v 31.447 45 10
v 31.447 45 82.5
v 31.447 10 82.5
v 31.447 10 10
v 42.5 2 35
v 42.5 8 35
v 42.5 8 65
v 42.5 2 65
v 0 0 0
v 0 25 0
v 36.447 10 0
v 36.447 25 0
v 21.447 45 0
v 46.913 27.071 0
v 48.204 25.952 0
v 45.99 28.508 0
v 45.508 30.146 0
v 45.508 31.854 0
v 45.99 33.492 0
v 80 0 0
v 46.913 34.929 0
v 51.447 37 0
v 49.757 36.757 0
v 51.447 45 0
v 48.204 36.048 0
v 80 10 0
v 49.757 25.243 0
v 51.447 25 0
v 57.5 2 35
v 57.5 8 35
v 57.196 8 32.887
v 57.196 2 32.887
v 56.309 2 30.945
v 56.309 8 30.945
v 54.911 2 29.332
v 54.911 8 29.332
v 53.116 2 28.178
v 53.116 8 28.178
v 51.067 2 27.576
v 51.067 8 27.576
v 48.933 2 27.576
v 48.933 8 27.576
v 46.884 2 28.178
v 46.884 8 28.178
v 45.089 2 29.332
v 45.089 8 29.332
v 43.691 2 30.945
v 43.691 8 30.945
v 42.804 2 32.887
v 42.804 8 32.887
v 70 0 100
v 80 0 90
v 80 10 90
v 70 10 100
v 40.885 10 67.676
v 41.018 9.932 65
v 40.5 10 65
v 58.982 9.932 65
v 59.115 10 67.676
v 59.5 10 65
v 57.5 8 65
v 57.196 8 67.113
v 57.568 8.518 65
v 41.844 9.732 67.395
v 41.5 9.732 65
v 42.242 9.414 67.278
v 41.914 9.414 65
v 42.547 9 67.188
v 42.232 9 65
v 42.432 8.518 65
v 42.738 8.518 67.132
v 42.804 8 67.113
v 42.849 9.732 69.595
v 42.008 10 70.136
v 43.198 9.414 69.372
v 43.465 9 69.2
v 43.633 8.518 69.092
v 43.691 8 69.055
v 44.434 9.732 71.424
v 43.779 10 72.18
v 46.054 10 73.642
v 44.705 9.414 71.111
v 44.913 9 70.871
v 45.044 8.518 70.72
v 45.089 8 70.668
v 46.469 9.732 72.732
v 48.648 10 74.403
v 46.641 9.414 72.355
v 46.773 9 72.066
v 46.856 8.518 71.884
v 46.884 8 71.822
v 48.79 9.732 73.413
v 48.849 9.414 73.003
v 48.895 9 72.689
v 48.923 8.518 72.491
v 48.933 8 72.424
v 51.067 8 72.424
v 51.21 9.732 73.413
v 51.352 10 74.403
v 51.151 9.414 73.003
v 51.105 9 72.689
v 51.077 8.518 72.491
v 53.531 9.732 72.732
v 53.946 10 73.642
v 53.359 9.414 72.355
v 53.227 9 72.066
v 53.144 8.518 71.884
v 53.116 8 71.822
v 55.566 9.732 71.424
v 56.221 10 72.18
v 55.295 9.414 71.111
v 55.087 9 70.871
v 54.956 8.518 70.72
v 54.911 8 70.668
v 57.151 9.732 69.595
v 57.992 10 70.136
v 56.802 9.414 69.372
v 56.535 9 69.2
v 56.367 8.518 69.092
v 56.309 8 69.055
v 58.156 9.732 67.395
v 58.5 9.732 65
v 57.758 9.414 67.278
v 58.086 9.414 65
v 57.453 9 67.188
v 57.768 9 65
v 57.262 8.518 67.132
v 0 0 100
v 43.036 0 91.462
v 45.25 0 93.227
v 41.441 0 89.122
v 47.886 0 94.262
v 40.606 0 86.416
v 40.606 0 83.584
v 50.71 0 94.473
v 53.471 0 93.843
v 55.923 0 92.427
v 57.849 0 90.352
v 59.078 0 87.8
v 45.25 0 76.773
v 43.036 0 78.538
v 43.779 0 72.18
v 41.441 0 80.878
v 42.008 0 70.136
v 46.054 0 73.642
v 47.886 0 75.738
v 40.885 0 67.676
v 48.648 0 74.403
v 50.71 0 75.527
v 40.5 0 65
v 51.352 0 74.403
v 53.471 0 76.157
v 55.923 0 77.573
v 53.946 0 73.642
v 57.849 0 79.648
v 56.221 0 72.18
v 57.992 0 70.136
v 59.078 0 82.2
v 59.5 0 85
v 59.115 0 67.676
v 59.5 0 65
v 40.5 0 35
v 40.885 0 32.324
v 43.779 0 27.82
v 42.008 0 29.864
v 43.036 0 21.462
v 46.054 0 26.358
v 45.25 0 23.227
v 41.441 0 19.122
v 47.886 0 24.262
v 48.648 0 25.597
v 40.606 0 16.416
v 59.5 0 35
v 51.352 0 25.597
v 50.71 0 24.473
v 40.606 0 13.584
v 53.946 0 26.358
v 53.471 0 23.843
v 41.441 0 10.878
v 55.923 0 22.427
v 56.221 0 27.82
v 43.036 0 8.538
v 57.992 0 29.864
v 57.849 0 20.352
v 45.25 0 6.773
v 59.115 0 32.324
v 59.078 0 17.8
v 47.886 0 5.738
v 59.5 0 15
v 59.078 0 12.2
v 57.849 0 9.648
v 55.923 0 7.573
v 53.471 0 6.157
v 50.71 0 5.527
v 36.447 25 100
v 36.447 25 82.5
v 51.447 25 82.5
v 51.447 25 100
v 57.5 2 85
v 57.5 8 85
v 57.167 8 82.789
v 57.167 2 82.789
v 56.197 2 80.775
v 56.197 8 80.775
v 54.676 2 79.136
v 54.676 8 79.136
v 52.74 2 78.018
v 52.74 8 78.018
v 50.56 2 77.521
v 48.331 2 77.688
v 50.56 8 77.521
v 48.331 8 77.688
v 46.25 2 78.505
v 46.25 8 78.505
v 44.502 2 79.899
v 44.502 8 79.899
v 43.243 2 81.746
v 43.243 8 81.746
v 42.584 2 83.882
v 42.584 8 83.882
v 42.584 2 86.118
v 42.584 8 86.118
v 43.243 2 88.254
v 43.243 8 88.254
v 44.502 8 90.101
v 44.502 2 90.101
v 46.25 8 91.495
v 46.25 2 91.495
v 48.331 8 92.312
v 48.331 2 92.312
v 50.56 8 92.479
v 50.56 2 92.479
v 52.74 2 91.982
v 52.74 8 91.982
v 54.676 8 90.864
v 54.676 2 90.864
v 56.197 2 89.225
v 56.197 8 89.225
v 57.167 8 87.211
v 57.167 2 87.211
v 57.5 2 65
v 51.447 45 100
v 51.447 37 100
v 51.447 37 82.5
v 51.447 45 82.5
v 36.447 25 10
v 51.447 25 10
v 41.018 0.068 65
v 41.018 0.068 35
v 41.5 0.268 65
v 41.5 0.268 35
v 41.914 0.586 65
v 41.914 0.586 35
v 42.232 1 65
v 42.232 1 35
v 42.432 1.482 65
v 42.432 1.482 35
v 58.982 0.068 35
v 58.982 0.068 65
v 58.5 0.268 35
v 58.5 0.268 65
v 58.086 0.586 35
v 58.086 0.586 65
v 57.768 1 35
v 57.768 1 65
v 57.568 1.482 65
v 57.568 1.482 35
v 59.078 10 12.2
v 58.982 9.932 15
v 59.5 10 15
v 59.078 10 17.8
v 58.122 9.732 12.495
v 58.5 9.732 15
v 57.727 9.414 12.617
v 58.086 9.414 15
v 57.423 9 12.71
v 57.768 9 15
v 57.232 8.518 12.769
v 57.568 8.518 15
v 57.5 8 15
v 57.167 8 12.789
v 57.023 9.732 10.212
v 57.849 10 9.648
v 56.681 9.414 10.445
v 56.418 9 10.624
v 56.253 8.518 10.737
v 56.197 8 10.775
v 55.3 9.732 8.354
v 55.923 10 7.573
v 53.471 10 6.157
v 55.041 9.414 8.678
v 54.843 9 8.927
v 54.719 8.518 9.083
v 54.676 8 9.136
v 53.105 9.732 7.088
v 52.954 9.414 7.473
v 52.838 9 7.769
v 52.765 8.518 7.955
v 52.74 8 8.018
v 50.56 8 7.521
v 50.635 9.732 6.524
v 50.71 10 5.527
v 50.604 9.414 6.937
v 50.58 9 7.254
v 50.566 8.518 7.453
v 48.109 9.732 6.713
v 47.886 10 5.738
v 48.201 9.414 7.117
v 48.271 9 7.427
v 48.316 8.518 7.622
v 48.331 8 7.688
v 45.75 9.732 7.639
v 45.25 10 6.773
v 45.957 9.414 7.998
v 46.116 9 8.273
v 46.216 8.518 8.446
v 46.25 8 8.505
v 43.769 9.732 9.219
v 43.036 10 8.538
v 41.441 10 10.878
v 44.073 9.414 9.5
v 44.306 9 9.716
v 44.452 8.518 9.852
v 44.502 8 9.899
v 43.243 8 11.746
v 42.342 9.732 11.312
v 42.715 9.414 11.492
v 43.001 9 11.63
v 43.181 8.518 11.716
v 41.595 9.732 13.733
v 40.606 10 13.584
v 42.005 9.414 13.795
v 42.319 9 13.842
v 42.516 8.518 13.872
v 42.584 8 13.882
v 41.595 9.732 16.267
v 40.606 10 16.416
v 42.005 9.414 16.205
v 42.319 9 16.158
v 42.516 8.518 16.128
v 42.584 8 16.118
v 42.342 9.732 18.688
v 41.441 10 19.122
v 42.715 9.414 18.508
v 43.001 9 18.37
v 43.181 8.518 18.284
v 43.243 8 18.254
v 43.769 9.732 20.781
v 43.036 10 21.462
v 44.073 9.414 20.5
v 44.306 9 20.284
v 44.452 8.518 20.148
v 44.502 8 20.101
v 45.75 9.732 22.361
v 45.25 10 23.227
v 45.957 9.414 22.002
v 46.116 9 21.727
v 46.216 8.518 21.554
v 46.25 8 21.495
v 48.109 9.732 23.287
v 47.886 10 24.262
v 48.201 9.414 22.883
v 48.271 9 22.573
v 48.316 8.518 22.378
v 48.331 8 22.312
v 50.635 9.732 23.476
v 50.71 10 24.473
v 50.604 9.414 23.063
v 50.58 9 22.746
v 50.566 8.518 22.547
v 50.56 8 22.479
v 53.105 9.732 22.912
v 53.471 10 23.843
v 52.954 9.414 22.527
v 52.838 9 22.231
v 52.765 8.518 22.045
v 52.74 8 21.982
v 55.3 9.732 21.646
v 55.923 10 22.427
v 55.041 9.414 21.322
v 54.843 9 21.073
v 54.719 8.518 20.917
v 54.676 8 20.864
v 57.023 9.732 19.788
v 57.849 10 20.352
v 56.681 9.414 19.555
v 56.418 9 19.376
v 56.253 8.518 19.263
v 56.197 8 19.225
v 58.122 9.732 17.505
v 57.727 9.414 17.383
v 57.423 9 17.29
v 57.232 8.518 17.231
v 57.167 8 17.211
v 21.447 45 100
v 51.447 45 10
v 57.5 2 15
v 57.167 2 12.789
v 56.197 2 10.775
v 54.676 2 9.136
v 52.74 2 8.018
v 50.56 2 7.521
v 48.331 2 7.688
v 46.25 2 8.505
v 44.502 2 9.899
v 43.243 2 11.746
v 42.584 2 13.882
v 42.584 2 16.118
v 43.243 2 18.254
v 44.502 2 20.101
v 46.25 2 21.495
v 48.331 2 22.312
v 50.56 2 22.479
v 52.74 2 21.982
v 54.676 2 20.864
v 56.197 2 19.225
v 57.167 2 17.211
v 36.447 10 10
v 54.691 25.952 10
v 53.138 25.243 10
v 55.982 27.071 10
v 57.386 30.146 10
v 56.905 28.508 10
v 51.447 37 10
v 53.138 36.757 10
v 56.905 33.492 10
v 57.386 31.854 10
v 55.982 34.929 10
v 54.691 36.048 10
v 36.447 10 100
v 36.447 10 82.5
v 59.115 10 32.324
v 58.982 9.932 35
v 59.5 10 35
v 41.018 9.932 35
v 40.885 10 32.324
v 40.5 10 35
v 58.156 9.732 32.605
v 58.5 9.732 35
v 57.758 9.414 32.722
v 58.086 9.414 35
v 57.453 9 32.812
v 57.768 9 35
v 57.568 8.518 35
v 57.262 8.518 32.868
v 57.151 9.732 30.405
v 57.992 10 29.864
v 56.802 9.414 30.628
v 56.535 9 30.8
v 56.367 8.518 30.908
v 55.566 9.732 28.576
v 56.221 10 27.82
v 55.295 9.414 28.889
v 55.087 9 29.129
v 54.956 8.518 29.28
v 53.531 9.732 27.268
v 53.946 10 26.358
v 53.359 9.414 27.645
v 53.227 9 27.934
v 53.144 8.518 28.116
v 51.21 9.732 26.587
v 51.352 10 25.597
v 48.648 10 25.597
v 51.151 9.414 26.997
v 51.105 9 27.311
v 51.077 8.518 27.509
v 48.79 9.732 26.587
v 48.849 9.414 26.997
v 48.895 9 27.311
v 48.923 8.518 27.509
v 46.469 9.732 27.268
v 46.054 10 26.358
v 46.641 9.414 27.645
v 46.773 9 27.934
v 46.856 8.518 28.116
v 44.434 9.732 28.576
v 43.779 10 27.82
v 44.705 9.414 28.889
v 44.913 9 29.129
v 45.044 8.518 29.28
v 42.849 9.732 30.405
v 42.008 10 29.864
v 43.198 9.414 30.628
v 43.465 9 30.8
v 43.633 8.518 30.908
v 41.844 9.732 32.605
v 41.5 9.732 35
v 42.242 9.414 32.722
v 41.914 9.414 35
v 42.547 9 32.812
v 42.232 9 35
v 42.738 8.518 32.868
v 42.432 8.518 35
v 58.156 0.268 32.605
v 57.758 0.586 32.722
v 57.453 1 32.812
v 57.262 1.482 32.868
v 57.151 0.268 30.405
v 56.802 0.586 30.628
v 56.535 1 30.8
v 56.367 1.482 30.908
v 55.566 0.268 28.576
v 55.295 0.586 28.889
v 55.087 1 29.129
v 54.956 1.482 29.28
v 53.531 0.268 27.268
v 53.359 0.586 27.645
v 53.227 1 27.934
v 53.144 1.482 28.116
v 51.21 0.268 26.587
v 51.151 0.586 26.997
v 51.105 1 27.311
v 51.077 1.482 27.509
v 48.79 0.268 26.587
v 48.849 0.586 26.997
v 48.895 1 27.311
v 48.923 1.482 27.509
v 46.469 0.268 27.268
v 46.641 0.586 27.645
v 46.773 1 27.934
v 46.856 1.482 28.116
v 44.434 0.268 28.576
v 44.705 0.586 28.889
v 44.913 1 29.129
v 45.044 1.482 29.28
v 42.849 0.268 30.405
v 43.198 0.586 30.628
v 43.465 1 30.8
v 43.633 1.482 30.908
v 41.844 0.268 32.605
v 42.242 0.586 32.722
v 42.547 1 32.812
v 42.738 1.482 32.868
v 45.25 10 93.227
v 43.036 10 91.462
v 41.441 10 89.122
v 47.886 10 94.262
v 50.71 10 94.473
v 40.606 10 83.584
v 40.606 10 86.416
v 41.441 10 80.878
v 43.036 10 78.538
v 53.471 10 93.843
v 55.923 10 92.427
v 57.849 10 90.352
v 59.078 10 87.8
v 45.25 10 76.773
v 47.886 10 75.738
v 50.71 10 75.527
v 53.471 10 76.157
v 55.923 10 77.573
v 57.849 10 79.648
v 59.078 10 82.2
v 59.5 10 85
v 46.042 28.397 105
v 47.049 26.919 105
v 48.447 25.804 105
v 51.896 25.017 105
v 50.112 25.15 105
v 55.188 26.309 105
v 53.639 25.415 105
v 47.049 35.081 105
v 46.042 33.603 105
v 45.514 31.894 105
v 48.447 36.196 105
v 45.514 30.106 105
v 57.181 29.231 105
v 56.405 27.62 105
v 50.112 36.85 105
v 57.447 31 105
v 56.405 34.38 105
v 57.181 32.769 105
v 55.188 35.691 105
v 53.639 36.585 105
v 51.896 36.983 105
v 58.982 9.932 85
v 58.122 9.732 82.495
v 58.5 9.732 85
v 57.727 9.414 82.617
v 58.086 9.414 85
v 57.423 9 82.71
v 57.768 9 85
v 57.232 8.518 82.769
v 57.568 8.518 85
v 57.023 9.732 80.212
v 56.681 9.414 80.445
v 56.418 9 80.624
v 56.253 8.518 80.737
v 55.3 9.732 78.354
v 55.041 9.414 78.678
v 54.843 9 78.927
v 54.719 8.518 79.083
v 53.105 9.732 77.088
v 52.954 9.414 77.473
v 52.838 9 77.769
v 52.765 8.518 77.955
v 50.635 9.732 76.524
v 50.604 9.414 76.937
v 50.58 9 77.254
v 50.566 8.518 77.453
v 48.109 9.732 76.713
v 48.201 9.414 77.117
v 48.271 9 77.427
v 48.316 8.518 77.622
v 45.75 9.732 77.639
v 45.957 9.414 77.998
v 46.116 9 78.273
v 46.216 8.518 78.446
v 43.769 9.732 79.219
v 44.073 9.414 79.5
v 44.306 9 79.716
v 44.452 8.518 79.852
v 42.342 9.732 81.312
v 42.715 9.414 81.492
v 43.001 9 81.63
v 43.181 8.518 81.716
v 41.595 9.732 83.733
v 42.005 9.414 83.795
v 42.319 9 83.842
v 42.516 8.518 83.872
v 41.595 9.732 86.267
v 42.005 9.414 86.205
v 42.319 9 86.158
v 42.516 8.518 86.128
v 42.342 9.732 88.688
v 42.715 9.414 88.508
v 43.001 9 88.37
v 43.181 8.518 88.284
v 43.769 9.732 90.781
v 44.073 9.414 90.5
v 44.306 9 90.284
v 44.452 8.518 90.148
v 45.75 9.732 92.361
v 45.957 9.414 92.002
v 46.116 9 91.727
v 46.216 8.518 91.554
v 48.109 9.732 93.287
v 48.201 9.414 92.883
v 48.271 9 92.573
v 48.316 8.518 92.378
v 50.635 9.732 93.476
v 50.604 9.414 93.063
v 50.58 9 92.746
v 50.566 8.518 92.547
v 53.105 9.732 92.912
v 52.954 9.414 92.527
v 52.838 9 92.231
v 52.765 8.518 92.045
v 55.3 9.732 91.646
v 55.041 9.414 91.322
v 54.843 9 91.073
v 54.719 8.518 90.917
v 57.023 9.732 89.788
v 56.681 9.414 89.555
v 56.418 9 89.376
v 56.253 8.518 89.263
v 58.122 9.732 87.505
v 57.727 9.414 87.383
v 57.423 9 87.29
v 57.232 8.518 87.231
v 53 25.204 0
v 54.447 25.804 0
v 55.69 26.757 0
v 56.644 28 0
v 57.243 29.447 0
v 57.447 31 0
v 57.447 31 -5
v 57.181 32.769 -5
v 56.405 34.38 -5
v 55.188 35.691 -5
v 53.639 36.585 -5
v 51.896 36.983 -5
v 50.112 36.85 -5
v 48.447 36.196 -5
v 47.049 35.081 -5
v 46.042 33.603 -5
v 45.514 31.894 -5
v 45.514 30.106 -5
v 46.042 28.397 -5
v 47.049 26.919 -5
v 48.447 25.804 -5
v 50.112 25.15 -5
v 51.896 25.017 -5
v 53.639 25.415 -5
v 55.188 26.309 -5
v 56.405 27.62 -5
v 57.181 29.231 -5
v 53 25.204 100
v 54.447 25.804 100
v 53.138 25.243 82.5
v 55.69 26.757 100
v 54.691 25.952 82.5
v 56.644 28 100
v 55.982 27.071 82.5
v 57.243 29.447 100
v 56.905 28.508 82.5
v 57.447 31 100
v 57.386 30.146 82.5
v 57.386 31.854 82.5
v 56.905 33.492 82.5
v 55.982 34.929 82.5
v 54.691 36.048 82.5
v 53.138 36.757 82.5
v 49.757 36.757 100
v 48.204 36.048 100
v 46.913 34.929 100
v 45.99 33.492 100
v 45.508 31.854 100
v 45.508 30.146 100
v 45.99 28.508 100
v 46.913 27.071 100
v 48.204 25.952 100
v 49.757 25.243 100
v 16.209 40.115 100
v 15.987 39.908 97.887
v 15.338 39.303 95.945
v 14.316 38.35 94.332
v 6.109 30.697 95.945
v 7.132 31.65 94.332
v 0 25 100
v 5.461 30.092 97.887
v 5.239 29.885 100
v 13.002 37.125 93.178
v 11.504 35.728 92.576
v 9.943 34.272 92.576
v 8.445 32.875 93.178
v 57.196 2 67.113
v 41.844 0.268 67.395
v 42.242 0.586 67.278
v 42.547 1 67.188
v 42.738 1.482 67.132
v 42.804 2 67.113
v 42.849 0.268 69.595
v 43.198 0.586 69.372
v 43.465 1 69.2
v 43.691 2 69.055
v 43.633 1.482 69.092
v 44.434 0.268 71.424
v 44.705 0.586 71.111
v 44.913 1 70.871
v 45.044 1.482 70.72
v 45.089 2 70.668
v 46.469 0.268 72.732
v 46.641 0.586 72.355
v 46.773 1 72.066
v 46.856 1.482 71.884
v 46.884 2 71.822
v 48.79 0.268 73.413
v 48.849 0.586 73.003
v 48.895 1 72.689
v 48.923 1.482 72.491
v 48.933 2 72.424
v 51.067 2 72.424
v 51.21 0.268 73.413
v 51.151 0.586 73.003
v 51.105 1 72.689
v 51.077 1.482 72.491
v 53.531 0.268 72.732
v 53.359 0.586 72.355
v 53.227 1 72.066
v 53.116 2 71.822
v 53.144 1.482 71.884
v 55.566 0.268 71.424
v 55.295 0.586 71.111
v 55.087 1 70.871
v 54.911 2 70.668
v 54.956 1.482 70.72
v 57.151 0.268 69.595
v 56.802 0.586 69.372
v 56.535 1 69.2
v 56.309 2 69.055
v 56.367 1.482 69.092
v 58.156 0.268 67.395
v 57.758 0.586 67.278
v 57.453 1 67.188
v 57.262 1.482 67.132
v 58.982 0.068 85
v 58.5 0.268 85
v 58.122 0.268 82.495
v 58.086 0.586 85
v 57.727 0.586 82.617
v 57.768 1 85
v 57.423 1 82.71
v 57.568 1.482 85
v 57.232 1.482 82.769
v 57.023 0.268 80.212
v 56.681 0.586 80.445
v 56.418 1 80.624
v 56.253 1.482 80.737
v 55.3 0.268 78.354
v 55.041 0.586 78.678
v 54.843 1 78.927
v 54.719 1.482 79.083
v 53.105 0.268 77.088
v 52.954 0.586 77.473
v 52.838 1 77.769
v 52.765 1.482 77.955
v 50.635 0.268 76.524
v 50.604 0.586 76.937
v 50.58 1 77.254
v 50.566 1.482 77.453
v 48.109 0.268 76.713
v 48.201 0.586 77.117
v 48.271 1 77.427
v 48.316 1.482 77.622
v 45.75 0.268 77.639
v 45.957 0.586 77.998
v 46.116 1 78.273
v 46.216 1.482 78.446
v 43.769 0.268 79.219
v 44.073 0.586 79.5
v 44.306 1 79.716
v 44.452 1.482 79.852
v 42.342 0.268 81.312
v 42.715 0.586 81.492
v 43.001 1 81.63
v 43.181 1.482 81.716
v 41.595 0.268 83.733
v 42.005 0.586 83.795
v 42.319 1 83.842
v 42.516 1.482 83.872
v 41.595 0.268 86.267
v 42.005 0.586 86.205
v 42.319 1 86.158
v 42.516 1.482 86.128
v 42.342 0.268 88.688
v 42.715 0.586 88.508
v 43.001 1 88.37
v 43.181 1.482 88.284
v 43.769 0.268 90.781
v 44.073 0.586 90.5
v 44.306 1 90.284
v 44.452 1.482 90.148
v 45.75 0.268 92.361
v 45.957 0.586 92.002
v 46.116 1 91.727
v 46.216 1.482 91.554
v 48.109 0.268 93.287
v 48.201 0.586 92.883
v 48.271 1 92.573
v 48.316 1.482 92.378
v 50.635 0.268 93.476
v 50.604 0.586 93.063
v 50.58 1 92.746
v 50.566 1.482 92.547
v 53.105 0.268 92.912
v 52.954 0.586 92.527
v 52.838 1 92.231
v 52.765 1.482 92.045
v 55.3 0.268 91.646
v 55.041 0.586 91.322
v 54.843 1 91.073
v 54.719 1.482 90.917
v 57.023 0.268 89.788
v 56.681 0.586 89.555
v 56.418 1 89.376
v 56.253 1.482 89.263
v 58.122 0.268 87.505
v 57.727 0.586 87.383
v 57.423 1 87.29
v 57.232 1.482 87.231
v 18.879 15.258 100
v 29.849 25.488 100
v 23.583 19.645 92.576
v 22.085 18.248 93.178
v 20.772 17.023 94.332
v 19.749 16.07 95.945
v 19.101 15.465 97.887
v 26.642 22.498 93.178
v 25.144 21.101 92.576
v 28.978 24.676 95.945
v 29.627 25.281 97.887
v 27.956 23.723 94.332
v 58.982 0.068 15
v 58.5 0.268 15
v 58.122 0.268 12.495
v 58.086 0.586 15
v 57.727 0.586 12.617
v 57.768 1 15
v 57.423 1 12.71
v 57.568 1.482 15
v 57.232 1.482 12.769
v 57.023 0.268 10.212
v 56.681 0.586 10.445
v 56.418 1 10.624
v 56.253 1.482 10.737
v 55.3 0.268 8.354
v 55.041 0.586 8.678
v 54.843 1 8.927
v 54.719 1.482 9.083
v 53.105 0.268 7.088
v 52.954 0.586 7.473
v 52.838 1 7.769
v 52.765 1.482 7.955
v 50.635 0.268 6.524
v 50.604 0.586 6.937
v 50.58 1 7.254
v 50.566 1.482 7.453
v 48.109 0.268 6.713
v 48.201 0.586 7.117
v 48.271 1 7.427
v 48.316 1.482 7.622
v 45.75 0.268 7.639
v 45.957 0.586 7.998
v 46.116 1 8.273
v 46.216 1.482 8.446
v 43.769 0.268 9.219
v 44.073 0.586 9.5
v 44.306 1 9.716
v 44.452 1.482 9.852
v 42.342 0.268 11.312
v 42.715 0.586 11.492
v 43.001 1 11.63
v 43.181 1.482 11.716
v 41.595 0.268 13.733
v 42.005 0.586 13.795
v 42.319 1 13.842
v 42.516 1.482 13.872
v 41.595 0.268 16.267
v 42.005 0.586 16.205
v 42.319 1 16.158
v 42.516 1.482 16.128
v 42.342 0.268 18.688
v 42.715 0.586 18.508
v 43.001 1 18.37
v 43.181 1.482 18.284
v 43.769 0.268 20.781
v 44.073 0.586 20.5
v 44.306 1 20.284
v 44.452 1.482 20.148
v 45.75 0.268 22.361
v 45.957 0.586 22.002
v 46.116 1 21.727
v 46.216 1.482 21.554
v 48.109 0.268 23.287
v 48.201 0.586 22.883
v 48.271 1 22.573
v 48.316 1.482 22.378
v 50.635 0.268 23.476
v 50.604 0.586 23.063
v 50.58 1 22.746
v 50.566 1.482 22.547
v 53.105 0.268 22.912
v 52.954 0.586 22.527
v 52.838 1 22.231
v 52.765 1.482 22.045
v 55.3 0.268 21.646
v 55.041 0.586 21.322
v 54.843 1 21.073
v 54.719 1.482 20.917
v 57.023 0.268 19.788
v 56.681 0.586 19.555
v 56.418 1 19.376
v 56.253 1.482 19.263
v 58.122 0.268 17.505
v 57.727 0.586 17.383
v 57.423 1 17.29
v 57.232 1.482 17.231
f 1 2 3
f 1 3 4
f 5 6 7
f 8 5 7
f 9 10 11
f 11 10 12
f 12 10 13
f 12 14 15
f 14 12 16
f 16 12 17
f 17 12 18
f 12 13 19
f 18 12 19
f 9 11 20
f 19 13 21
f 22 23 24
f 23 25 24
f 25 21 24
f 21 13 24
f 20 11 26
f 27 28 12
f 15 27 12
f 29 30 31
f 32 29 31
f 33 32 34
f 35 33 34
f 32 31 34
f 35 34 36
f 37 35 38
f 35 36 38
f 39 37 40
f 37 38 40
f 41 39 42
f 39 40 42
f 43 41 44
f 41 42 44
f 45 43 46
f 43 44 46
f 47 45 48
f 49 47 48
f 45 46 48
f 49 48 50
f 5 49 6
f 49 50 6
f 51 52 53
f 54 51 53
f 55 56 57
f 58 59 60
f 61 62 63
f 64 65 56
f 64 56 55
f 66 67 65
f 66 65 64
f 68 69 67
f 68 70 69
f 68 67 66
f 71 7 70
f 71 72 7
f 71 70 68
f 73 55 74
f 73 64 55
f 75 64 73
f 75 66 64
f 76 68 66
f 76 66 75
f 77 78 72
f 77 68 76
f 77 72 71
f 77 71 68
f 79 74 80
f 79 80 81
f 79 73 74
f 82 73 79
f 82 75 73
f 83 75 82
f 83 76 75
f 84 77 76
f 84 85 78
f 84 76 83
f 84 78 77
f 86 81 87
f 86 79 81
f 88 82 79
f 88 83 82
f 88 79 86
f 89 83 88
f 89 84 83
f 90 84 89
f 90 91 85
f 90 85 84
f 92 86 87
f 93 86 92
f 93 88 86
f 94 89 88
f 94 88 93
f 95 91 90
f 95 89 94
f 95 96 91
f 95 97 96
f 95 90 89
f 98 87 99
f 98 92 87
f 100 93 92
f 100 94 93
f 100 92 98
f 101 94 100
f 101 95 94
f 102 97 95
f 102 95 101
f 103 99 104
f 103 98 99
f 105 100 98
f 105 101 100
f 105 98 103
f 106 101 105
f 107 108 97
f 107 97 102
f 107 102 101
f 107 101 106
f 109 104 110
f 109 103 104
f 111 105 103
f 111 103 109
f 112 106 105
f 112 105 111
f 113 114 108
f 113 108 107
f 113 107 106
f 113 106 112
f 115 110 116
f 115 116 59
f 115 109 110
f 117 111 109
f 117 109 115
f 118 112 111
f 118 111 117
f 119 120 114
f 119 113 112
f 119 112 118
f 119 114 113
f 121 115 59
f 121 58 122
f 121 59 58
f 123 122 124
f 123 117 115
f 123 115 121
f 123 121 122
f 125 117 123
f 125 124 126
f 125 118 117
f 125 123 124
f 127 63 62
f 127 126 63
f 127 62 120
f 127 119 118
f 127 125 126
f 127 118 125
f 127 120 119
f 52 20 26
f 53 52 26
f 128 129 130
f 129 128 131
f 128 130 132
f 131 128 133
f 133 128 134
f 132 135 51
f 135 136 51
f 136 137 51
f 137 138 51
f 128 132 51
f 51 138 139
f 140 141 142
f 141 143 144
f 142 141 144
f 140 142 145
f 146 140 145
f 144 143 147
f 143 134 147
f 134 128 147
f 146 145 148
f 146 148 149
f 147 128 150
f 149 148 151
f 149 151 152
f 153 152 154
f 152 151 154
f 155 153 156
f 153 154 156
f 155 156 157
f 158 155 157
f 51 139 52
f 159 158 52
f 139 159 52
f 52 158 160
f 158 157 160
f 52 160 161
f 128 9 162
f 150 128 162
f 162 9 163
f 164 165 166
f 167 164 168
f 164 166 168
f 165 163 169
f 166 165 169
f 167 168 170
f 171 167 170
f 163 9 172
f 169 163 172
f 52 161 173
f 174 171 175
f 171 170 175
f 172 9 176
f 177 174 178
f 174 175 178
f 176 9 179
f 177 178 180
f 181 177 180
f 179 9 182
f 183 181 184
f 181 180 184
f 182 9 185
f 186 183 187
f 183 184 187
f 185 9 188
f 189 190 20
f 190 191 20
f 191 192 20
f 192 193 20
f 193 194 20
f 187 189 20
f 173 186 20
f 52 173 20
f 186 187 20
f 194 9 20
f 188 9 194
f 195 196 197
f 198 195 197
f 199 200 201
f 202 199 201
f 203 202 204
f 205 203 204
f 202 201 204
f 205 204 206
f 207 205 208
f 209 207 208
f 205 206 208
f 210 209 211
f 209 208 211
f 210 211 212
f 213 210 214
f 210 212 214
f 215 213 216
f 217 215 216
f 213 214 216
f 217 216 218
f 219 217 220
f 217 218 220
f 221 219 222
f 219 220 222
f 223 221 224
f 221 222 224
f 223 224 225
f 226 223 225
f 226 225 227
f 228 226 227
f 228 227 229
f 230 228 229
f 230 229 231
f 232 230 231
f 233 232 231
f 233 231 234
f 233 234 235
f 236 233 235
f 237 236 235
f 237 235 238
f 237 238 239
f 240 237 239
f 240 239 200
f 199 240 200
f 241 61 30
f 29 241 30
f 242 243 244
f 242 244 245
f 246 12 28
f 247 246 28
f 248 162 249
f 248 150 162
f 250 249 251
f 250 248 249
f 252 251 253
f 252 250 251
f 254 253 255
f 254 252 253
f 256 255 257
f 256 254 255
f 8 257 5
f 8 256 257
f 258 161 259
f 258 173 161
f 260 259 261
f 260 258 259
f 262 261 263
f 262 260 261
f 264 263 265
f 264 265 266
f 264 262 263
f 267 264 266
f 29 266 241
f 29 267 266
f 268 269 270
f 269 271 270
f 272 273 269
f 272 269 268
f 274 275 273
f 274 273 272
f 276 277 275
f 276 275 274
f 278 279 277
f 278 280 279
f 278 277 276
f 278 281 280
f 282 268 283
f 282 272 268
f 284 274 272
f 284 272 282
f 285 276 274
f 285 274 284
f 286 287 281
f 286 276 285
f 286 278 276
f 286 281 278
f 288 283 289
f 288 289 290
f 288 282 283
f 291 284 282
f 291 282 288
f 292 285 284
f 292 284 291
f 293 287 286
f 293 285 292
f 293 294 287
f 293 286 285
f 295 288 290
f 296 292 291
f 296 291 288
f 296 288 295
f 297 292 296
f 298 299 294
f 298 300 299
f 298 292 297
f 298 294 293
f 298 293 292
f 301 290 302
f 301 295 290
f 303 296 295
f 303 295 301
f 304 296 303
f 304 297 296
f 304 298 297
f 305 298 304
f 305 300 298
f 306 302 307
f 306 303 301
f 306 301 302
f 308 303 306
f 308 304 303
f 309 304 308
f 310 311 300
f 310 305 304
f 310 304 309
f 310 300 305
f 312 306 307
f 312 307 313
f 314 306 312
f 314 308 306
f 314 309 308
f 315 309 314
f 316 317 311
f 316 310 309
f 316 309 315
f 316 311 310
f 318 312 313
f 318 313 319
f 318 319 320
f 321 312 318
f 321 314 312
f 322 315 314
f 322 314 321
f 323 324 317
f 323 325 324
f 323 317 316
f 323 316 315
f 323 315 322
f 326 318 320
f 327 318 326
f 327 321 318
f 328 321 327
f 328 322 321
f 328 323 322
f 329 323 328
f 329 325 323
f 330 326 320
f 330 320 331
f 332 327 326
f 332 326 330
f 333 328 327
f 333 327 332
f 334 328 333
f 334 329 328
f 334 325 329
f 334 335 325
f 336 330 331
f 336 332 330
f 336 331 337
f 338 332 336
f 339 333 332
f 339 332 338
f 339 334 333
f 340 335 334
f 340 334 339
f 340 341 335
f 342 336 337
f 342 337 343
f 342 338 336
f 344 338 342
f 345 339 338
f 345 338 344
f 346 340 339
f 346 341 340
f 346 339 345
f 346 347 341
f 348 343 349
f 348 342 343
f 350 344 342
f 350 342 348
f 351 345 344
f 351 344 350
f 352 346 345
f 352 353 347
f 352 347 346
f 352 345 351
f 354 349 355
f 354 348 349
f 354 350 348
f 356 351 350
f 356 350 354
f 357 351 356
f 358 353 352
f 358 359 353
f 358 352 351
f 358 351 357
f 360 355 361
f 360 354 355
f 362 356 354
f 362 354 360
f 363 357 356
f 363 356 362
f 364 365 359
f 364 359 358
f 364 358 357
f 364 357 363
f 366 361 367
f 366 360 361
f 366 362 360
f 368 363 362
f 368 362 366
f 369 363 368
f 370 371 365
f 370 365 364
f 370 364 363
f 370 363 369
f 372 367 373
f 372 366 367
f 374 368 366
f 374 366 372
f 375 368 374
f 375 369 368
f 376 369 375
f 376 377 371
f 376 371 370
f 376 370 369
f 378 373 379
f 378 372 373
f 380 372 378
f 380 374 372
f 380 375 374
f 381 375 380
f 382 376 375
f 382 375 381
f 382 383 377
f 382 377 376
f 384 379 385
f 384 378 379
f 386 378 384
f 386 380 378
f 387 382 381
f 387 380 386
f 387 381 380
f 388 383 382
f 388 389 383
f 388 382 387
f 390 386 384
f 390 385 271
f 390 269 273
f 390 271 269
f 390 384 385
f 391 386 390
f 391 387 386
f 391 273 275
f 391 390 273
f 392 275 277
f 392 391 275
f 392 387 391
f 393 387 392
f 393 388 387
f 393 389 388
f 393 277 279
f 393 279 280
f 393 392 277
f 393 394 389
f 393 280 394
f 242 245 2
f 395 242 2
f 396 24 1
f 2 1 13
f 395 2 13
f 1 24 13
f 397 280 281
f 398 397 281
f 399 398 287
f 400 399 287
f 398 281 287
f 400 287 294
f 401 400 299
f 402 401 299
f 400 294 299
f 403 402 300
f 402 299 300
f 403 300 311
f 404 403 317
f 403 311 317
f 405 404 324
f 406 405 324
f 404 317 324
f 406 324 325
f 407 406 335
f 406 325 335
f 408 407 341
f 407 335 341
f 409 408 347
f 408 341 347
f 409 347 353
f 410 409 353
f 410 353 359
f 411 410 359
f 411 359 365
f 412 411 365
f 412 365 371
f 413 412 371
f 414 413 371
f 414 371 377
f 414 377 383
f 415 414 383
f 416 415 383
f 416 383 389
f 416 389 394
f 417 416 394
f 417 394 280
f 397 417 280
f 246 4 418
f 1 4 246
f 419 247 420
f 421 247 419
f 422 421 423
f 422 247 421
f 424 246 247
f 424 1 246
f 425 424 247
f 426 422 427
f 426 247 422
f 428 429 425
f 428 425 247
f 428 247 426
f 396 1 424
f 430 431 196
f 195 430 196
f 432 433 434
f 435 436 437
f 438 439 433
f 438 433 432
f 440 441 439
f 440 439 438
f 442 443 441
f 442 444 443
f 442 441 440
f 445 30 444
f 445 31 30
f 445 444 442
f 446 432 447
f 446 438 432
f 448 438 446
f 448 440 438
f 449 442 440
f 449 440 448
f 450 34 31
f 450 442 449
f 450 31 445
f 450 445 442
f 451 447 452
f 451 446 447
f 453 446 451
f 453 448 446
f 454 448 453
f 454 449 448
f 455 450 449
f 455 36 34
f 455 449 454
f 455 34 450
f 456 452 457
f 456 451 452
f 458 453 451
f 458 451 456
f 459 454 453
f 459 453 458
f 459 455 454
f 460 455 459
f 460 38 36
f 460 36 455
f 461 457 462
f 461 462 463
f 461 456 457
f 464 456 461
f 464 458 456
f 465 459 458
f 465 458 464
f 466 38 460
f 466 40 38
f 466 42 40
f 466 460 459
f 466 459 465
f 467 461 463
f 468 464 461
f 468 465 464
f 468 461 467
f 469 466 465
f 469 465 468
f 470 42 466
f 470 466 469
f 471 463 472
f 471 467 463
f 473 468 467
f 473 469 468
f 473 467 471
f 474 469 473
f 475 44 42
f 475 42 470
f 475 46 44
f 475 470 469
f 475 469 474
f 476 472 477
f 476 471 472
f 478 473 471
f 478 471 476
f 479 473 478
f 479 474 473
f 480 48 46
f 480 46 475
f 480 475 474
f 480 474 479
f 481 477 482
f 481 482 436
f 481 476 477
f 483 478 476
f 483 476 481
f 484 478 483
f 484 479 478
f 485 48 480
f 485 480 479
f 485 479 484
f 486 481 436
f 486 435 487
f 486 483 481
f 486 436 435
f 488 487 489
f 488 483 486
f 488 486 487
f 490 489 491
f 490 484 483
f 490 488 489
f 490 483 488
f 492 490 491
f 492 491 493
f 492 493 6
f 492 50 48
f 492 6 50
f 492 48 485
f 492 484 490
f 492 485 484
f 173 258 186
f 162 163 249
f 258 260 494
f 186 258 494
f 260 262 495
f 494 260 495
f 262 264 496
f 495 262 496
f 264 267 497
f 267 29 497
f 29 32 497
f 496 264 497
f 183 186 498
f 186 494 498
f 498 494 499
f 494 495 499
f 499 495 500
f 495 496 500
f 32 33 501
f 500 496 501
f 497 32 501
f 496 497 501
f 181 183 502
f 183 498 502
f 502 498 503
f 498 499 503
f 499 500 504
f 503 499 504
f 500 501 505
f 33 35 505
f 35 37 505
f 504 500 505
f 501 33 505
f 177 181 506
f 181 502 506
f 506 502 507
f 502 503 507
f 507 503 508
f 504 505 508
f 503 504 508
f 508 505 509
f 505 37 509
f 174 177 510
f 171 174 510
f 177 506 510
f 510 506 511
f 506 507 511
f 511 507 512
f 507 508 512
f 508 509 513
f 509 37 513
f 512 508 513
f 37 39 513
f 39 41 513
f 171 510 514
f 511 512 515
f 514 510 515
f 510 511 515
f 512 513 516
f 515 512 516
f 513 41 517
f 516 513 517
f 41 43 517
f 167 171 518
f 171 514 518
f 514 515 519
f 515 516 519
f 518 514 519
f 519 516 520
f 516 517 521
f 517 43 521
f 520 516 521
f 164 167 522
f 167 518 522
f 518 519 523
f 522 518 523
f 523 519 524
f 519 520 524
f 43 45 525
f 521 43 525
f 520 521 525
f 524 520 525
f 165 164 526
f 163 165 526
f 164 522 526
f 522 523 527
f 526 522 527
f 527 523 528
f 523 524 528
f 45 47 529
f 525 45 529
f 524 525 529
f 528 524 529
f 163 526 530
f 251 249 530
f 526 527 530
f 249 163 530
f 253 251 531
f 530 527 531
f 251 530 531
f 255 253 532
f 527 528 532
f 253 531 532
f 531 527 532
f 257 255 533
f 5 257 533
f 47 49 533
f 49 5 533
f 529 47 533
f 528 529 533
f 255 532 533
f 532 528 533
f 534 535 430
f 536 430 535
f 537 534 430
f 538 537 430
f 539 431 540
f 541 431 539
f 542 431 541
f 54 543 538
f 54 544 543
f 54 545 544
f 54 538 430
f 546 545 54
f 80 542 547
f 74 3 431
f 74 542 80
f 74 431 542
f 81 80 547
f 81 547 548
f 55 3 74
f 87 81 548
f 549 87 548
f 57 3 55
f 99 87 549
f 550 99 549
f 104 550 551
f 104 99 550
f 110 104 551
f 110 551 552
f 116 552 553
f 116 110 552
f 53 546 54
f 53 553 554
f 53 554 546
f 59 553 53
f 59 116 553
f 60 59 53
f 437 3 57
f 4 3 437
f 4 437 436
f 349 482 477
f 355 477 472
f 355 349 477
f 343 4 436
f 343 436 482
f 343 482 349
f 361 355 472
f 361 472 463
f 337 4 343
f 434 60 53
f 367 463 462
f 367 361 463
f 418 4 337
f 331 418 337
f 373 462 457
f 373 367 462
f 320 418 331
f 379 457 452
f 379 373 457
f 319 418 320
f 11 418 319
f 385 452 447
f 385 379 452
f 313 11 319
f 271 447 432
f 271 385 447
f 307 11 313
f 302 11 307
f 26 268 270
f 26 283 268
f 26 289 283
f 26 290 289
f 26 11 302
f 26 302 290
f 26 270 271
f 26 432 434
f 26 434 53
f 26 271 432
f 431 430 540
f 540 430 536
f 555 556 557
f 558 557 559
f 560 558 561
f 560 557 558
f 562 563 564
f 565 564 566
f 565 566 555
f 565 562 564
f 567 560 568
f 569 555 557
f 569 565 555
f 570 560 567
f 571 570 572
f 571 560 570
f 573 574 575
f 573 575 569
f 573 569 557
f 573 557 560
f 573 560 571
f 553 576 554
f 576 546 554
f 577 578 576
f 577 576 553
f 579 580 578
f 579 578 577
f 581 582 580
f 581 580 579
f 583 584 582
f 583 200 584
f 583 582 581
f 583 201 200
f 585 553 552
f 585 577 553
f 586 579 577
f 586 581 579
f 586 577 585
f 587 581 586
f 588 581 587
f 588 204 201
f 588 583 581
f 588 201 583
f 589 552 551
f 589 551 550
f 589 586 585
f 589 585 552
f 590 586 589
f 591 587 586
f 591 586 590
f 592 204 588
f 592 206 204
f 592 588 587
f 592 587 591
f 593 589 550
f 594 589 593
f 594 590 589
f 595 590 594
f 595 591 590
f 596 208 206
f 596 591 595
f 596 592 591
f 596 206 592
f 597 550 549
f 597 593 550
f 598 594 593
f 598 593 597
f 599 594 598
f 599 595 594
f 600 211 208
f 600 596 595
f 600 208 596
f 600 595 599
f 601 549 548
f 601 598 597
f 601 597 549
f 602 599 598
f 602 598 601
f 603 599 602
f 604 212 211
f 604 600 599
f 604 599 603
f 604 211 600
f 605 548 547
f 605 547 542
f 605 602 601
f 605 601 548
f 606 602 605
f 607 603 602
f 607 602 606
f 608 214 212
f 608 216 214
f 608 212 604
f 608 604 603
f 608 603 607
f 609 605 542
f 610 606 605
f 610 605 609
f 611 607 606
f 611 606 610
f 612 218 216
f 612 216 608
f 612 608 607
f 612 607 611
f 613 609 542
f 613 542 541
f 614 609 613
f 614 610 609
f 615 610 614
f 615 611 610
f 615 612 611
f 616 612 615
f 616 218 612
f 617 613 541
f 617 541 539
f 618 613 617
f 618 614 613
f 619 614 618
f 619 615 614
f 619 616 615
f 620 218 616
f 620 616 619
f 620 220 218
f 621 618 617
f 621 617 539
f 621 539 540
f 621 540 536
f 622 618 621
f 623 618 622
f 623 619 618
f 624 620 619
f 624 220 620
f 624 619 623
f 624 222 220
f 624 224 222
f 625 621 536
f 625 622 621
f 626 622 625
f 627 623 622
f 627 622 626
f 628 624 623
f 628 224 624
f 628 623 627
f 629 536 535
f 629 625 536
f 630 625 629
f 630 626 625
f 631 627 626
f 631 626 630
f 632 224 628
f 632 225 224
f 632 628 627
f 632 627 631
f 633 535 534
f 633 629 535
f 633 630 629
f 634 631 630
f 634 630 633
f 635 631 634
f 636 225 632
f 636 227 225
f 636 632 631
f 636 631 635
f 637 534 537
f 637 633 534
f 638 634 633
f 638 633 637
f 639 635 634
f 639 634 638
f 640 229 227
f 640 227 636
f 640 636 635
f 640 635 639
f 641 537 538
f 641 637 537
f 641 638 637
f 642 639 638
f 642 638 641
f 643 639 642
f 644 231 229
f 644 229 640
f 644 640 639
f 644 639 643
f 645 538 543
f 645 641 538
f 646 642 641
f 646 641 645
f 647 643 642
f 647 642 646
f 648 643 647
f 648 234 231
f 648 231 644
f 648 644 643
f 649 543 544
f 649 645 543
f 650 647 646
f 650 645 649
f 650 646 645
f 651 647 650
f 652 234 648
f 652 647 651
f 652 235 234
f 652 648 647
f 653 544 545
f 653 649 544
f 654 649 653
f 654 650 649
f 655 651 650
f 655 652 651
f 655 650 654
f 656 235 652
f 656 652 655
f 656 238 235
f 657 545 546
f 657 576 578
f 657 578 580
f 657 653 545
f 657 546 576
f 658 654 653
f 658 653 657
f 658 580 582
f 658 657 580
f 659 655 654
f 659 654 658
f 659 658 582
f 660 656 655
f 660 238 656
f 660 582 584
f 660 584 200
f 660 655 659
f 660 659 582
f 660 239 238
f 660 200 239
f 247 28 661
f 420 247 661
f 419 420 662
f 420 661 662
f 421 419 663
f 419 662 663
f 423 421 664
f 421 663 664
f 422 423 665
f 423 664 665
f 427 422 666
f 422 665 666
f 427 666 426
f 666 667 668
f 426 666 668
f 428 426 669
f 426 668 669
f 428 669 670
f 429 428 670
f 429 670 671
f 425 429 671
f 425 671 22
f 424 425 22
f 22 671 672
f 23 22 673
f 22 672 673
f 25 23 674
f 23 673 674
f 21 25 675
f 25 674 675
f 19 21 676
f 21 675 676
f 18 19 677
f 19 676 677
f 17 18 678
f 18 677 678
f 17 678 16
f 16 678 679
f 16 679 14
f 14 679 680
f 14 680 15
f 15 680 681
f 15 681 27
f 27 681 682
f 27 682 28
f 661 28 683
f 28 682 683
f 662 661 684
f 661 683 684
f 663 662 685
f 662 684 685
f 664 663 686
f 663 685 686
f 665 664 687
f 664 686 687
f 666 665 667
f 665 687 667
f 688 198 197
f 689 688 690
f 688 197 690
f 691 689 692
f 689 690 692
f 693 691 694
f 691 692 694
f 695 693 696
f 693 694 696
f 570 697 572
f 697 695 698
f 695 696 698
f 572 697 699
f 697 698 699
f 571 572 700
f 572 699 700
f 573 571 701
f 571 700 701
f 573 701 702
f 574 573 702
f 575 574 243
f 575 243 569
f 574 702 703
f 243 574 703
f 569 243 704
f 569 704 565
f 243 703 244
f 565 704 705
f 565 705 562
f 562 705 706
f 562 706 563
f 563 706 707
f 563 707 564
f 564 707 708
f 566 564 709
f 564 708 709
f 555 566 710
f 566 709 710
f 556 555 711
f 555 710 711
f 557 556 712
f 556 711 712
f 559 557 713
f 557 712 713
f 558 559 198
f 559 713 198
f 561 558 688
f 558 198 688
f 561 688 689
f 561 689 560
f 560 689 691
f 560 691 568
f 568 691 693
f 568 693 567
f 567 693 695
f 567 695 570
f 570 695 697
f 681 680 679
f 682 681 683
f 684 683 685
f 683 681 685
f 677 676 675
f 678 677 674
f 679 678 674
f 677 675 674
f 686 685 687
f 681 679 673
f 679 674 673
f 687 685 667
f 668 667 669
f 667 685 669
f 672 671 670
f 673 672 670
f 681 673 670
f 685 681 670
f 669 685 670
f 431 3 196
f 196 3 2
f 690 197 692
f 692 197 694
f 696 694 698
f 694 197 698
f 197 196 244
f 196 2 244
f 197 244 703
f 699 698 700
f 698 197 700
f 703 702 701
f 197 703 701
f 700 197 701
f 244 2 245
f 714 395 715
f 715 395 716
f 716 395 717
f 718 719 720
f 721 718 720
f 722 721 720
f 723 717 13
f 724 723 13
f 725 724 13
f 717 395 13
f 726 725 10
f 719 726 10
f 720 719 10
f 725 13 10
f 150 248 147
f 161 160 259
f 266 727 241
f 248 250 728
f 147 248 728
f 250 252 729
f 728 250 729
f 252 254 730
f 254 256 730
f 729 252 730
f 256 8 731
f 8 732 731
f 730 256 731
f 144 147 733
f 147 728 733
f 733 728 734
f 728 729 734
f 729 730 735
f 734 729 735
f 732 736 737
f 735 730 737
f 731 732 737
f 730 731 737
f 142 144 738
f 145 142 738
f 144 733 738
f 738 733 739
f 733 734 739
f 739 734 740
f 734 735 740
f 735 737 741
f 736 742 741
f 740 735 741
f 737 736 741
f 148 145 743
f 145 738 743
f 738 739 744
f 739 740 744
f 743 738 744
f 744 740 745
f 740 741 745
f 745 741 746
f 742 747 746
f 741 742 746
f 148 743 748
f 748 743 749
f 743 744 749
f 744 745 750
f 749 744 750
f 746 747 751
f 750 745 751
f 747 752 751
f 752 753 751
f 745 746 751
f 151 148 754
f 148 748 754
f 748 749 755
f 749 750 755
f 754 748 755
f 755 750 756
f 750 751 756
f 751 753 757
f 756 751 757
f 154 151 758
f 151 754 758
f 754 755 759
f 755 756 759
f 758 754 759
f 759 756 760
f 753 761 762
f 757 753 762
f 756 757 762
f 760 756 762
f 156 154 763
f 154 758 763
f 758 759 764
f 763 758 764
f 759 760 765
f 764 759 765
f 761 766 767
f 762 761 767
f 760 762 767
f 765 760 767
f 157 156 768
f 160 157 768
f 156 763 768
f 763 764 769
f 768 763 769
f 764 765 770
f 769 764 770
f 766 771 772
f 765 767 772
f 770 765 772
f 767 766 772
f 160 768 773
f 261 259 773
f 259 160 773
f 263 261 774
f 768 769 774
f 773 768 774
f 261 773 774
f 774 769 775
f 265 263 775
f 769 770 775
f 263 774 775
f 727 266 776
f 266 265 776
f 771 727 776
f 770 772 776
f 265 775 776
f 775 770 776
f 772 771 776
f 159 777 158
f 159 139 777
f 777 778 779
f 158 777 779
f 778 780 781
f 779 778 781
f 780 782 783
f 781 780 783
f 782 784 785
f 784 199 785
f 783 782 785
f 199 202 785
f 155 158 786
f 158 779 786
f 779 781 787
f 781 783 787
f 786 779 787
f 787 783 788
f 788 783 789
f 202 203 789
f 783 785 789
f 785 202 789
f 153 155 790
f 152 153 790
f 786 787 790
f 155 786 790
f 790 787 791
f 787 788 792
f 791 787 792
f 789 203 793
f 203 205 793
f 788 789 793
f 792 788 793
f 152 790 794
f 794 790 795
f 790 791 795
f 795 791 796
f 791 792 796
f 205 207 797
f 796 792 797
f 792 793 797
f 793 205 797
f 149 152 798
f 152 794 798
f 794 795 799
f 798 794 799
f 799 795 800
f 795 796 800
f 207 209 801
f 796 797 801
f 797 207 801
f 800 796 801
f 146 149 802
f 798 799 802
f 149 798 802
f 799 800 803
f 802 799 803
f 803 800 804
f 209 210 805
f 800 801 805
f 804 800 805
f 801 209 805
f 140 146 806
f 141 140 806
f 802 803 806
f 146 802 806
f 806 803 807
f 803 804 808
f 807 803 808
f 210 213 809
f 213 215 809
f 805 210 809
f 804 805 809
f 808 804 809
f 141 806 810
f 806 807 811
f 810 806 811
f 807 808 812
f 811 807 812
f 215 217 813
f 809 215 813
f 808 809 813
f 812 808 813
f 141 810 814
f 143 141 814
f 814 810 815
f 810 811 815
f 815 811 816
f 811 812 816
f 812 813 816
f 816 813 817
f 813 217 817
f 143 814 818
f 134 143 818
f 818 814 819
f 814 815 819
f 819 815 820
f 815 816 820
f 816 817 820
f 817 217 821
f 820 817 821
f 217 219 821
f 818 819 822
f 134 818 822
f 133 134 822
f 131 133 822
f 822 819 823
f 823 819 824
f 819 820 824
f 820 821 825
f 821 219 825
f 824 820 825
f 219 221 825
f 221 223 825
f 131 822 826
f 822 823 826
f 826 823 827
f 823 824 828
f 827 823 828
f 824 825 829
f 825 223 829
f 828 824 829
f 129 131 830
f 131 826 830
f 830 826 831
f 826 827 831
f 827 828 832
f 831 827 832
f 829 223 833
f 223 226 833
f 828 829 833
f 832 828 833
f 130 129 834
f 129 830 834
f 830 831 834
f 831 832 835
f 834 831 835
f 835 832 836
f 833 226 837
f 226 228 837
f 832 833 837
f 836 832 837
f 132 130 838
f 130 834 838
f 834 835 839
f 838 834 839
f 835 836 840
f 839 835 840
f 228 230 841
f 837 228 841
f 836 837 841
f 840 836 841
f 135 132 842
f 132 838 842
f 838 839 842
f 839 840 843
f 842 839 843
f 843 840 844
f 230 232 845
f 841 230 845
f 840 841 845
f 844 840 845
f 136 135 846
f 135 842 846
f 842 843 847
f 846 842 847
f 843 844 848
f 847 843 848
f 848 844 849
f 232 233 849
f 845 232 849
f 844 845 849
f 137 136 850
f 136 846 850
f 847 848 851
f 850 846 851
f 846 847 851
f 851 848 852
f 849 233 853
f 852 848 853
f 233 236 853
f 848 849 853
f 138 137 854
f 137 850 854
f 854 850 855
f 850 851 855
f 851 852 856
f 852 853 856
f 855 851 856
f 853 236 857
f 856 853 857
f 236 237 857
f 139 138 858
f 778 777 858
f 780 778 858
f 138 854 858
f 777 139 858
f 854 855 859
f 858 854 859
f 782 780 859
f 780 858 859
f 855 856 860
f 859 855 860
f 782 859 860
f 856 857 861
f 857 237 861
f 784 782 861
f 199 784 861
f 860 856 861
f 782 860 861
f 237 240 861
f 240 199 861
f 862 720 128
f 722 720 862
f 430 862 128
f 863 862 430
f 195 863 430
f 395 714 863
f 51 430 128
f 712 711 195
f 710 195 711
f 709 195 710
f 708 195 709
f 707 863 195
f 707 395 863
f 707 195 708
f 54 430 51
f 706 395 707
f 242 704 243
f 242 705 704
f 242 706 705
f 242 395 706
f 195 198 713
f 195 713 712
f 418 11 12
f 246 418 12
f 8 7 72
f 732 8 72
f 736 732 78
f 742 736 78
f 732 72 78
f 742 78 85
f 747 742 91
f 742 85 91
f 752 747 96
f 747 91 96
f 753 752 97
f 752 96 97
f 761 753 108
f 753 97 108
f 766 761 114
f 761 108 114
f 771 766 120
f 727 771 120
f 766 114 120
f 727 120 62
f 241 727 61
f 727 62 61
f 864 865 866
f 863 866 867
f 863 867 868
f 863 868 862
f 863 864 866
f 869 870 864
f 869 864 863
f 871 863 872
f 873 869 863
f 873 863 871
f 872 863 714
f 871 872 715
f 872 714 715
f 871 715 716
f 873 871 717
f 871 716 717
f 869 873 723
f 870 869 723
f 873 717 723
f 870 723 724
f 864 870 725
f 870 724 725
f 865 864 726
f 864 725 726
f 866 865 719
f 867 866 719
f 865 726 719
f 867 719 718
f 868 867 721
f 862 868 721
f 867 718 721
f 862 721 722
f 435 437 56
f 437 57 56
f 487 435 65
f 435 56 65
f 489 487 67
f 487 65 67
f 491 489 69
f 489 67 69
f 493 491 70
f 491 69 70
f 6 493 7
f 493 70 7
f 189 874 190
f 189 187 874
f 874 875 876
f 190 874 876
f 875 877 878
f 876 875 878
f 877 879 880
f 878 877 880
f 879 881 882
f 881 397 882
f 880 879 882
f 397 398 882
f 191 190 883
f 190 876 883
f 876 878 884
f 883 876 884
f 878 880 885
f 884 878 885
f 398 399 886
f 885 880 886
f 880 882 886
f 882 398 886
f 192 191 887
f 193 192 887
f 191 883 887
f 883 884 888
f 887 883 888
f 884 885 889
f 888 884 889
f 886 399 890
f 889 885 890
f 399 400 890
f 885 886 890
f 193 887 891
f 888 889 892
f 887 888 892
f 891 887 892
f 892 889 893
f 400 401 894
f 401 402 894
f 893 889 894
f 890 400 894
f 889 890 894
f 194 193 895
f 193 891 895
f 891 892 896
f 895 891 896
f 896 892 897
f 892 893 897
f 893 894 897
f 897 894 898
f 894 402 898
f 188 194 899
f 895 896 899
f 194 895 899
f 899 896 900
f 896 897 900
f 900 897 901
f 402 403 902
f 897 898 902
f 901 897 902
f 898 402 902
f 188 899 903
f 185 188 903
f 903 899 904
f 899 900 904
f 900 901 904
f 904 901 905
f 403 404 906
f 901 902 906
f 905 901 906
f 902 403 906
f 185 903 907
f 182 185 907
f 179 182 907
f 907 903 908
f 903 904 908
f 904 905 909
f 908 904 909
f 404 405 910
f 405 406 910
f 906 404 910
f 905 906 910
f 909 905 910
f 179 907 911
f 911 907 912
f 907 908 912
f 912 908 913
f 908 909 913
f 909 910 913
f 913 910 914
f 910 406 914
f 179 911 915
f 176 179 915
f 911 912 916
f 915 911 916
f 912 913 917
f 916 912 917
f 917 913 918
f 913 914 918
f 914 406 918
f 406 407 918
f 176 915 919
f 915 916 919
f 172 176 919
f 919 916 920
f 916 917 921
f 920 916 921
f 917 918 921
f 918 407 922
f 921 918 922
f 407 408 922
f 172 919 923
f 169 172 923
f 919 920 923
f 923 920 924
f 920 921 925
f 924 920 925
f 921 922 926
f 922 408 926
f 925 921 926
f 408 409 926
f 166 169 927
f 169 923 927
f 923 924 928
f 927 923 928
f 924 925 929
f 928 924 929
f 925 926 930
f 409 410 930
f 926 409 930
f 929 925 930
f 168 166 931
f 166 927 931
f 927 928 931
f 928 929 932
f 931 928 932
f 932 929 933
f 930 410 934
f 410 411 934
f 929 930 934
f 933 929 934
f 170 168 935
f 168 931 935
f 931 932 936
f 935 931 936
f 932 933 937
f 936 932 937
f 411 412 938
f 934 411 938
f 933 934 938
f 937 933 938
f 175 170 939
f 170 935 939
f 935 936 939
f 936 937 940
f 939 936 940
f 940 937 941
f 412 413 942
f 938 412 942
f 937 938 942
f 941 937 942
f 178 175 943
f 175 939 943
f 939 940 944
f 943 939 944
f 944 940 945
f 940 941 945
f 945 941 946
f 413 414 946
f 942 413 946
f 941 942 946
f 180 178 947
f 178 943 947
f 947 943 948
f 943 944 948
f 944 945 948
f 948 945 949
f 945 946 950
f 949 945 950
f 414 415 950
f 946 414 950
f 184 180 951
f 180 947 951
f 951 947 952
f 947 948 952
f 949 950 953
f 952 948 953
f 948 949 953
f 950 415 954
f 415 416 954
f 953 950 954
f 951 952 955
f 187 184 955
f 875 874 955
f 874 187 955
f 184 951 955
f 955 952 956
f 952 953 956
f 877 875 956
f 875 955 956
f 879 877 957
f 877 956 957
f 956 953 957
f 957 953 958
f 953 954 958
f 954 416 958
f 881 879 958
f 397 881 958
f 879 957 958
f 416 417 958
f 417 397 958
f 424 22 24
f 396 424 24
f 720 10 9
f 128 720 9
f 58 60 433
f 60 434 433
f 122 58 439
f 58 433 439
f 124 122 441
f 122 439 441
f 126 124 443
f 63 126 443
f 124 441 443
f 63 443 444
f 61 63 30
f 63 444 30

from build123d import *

# Parameters (mm, degrees)
DODANIE_WYCI_GNI_CIE1_DEPTH      = 100
SFAZOWANIE1_SIZE                 = 10
SZKIC3_R                         = 6
DODANIE_WYCI_GNI_CIE2_DEPTH      = 5
DODANIE_WYCI_GNI_CIE2_DEPTH_BACK = 105
SZKIC4_W                         = 26
SZKIC4_H                         = 72.5
WYTNIJ_WYCI_GNI_CIE1_DEPTH       = 35
SZKIC5_R                         = 7.5
WYTNIJ_WYCI_GNI_CIE3_DEPTH       = 11
ZAOKR_GLENIE2_R                  = 2
SZKIC6_R                         = 7.5
WYTNIJ_WYCI_GNI_CIE5_DEPTH       = 20


with BuildPart() as part:
    # Szkic2 → Dodanie-wyciągnięcie1 (new body)
    with BuildSketch(Plane.XY):
        with BuildLine():
            Line((0, 0), (80, 0))
            Line((80, 0), (80, 10))
            Line((80, 10), (36.4473742, 10))
            Line((36.4473742, 10), (36.4473742, 25))
            Line((36.4473742, 25), (51.4473742, 25))
            ThreePointArc((51.4473742, 25), (57.4473742, 31), (51.4473742, 37))
            Line((51.4473742, 37), (51.4473742, 45))
            Line((51.4473742, 45), (21.4473742, 45))
            Line((21.4473742, 45), (0, 25))
            Line((0, 25), (0, 0))
        make_face()
    extrude(amount=DODANIE_WYCI_GNI_CIE1_DEPTH)

    # Sfazowanie1
    sfazowanie1_edges = [part.edges().sort_by_distance(p)[0] for p in [
        (80, 5, 100),
    ]]
    chamfer(sfazowanie1_edges, length=SFAZOWANIE1_SIZE)

    # Szkic3 → Dodanie-wyciągnięcie2 (add, two sides)
    with BuildSketch(Plane.XY.offset(100)) as dodanie_wyci_gni_cie2_sk:
        with Locations((51.4473742, 31)):
            Circle(SZKIC3_R)
    extrude(amount=DODANIE_WYCI_GNI_CIE2_DEPTH)
    extrude(dodanie_wyci_gni_cie2_sk.sketch, amount=-DODANIE_WYCI_GNI_CIE2_DEPTH_BACK)

    # Szkic4 → Wytnij-wyciągnięcie1 (cut)
    with BuildSketch(Plane(origin=(0, 45, 0), x_dir=(1, 0, 0), z_dir=(0, 1, 0))):
        with Locations((44.4473742, -46.25)):
            Rectangle(SZKIC4_W, SZKIC4_H)
    extrude(amount=-WYTNIJ_WYCI_GNI_CIE1_DEPTH, mode=Mode.SUBTRACT)

    # Szkic5 → Wytnij-wyciągnięcie3 (cut, through all)
    with BuildSketch(Plane(origin=(0, 10, 0), x_dir=(1, 0, 0), z_dir=(0, 1, 0))):
        with Locations((50, -15)):
            Circle(SZKIC5_R)
        with Locations((50, -85)):
            Circle(SZKIC5_R)
        with BuildLine():
            Line((42.5, -35), (42.5, -65))
            ThreePointArc((42.5, -65), (50, -72.5), (57.5, -65))
            Line((57.5, -65), (57.5, -35))
            ThreePointArc((57.5, -35), (50, -27.5), (42.5, -35))
        make_face()
    extrude(amount=-WYTNIJ_WYCI_GNI_CIE3_DEPTH, mode=Mode.SUBTRACT)

    # Zaokrąglenie2
    zaokr_glenie2_edges = [part.edges().sort_by_distance(p)[0] for p in [
        (42.5, 0, 15),
        (42.5, 10, 15),
        (42.5, 0, 85),
        (42.5, 10, 85),
        (50, 0, 27.5),
        (57.5, 0, 50),
        (50, 0, 72.5),
        (42.5, 0, 50),
        (50, 10, 27.5),
        (42.5, 10, 50),
        (50, 10, 72.5),
        (57.5, 10, 50),
    ]]
    fillet(zaokr_glenie2_edges, radius=ZAOKR_GLENIE2_R)

    # Szkic6 → Wytnij-wyciągnięcie5 (cut)
    with BuildSketch(Plane(origin=(-12.469550628, 13.371955922, 0), x_dir=(0.731353702, 0.68199836, 0), z_dir=(-0.68199836, 0.731353702, 0))):
        with Locations((31.712750858, -100)):
            Circle(SZKIC6_R)
    extrude(amount=-WYTNIJ_WYCI_GNI_CIE5_DEPTH, mode=Mode.SUBTRACT)


solid = part.part
